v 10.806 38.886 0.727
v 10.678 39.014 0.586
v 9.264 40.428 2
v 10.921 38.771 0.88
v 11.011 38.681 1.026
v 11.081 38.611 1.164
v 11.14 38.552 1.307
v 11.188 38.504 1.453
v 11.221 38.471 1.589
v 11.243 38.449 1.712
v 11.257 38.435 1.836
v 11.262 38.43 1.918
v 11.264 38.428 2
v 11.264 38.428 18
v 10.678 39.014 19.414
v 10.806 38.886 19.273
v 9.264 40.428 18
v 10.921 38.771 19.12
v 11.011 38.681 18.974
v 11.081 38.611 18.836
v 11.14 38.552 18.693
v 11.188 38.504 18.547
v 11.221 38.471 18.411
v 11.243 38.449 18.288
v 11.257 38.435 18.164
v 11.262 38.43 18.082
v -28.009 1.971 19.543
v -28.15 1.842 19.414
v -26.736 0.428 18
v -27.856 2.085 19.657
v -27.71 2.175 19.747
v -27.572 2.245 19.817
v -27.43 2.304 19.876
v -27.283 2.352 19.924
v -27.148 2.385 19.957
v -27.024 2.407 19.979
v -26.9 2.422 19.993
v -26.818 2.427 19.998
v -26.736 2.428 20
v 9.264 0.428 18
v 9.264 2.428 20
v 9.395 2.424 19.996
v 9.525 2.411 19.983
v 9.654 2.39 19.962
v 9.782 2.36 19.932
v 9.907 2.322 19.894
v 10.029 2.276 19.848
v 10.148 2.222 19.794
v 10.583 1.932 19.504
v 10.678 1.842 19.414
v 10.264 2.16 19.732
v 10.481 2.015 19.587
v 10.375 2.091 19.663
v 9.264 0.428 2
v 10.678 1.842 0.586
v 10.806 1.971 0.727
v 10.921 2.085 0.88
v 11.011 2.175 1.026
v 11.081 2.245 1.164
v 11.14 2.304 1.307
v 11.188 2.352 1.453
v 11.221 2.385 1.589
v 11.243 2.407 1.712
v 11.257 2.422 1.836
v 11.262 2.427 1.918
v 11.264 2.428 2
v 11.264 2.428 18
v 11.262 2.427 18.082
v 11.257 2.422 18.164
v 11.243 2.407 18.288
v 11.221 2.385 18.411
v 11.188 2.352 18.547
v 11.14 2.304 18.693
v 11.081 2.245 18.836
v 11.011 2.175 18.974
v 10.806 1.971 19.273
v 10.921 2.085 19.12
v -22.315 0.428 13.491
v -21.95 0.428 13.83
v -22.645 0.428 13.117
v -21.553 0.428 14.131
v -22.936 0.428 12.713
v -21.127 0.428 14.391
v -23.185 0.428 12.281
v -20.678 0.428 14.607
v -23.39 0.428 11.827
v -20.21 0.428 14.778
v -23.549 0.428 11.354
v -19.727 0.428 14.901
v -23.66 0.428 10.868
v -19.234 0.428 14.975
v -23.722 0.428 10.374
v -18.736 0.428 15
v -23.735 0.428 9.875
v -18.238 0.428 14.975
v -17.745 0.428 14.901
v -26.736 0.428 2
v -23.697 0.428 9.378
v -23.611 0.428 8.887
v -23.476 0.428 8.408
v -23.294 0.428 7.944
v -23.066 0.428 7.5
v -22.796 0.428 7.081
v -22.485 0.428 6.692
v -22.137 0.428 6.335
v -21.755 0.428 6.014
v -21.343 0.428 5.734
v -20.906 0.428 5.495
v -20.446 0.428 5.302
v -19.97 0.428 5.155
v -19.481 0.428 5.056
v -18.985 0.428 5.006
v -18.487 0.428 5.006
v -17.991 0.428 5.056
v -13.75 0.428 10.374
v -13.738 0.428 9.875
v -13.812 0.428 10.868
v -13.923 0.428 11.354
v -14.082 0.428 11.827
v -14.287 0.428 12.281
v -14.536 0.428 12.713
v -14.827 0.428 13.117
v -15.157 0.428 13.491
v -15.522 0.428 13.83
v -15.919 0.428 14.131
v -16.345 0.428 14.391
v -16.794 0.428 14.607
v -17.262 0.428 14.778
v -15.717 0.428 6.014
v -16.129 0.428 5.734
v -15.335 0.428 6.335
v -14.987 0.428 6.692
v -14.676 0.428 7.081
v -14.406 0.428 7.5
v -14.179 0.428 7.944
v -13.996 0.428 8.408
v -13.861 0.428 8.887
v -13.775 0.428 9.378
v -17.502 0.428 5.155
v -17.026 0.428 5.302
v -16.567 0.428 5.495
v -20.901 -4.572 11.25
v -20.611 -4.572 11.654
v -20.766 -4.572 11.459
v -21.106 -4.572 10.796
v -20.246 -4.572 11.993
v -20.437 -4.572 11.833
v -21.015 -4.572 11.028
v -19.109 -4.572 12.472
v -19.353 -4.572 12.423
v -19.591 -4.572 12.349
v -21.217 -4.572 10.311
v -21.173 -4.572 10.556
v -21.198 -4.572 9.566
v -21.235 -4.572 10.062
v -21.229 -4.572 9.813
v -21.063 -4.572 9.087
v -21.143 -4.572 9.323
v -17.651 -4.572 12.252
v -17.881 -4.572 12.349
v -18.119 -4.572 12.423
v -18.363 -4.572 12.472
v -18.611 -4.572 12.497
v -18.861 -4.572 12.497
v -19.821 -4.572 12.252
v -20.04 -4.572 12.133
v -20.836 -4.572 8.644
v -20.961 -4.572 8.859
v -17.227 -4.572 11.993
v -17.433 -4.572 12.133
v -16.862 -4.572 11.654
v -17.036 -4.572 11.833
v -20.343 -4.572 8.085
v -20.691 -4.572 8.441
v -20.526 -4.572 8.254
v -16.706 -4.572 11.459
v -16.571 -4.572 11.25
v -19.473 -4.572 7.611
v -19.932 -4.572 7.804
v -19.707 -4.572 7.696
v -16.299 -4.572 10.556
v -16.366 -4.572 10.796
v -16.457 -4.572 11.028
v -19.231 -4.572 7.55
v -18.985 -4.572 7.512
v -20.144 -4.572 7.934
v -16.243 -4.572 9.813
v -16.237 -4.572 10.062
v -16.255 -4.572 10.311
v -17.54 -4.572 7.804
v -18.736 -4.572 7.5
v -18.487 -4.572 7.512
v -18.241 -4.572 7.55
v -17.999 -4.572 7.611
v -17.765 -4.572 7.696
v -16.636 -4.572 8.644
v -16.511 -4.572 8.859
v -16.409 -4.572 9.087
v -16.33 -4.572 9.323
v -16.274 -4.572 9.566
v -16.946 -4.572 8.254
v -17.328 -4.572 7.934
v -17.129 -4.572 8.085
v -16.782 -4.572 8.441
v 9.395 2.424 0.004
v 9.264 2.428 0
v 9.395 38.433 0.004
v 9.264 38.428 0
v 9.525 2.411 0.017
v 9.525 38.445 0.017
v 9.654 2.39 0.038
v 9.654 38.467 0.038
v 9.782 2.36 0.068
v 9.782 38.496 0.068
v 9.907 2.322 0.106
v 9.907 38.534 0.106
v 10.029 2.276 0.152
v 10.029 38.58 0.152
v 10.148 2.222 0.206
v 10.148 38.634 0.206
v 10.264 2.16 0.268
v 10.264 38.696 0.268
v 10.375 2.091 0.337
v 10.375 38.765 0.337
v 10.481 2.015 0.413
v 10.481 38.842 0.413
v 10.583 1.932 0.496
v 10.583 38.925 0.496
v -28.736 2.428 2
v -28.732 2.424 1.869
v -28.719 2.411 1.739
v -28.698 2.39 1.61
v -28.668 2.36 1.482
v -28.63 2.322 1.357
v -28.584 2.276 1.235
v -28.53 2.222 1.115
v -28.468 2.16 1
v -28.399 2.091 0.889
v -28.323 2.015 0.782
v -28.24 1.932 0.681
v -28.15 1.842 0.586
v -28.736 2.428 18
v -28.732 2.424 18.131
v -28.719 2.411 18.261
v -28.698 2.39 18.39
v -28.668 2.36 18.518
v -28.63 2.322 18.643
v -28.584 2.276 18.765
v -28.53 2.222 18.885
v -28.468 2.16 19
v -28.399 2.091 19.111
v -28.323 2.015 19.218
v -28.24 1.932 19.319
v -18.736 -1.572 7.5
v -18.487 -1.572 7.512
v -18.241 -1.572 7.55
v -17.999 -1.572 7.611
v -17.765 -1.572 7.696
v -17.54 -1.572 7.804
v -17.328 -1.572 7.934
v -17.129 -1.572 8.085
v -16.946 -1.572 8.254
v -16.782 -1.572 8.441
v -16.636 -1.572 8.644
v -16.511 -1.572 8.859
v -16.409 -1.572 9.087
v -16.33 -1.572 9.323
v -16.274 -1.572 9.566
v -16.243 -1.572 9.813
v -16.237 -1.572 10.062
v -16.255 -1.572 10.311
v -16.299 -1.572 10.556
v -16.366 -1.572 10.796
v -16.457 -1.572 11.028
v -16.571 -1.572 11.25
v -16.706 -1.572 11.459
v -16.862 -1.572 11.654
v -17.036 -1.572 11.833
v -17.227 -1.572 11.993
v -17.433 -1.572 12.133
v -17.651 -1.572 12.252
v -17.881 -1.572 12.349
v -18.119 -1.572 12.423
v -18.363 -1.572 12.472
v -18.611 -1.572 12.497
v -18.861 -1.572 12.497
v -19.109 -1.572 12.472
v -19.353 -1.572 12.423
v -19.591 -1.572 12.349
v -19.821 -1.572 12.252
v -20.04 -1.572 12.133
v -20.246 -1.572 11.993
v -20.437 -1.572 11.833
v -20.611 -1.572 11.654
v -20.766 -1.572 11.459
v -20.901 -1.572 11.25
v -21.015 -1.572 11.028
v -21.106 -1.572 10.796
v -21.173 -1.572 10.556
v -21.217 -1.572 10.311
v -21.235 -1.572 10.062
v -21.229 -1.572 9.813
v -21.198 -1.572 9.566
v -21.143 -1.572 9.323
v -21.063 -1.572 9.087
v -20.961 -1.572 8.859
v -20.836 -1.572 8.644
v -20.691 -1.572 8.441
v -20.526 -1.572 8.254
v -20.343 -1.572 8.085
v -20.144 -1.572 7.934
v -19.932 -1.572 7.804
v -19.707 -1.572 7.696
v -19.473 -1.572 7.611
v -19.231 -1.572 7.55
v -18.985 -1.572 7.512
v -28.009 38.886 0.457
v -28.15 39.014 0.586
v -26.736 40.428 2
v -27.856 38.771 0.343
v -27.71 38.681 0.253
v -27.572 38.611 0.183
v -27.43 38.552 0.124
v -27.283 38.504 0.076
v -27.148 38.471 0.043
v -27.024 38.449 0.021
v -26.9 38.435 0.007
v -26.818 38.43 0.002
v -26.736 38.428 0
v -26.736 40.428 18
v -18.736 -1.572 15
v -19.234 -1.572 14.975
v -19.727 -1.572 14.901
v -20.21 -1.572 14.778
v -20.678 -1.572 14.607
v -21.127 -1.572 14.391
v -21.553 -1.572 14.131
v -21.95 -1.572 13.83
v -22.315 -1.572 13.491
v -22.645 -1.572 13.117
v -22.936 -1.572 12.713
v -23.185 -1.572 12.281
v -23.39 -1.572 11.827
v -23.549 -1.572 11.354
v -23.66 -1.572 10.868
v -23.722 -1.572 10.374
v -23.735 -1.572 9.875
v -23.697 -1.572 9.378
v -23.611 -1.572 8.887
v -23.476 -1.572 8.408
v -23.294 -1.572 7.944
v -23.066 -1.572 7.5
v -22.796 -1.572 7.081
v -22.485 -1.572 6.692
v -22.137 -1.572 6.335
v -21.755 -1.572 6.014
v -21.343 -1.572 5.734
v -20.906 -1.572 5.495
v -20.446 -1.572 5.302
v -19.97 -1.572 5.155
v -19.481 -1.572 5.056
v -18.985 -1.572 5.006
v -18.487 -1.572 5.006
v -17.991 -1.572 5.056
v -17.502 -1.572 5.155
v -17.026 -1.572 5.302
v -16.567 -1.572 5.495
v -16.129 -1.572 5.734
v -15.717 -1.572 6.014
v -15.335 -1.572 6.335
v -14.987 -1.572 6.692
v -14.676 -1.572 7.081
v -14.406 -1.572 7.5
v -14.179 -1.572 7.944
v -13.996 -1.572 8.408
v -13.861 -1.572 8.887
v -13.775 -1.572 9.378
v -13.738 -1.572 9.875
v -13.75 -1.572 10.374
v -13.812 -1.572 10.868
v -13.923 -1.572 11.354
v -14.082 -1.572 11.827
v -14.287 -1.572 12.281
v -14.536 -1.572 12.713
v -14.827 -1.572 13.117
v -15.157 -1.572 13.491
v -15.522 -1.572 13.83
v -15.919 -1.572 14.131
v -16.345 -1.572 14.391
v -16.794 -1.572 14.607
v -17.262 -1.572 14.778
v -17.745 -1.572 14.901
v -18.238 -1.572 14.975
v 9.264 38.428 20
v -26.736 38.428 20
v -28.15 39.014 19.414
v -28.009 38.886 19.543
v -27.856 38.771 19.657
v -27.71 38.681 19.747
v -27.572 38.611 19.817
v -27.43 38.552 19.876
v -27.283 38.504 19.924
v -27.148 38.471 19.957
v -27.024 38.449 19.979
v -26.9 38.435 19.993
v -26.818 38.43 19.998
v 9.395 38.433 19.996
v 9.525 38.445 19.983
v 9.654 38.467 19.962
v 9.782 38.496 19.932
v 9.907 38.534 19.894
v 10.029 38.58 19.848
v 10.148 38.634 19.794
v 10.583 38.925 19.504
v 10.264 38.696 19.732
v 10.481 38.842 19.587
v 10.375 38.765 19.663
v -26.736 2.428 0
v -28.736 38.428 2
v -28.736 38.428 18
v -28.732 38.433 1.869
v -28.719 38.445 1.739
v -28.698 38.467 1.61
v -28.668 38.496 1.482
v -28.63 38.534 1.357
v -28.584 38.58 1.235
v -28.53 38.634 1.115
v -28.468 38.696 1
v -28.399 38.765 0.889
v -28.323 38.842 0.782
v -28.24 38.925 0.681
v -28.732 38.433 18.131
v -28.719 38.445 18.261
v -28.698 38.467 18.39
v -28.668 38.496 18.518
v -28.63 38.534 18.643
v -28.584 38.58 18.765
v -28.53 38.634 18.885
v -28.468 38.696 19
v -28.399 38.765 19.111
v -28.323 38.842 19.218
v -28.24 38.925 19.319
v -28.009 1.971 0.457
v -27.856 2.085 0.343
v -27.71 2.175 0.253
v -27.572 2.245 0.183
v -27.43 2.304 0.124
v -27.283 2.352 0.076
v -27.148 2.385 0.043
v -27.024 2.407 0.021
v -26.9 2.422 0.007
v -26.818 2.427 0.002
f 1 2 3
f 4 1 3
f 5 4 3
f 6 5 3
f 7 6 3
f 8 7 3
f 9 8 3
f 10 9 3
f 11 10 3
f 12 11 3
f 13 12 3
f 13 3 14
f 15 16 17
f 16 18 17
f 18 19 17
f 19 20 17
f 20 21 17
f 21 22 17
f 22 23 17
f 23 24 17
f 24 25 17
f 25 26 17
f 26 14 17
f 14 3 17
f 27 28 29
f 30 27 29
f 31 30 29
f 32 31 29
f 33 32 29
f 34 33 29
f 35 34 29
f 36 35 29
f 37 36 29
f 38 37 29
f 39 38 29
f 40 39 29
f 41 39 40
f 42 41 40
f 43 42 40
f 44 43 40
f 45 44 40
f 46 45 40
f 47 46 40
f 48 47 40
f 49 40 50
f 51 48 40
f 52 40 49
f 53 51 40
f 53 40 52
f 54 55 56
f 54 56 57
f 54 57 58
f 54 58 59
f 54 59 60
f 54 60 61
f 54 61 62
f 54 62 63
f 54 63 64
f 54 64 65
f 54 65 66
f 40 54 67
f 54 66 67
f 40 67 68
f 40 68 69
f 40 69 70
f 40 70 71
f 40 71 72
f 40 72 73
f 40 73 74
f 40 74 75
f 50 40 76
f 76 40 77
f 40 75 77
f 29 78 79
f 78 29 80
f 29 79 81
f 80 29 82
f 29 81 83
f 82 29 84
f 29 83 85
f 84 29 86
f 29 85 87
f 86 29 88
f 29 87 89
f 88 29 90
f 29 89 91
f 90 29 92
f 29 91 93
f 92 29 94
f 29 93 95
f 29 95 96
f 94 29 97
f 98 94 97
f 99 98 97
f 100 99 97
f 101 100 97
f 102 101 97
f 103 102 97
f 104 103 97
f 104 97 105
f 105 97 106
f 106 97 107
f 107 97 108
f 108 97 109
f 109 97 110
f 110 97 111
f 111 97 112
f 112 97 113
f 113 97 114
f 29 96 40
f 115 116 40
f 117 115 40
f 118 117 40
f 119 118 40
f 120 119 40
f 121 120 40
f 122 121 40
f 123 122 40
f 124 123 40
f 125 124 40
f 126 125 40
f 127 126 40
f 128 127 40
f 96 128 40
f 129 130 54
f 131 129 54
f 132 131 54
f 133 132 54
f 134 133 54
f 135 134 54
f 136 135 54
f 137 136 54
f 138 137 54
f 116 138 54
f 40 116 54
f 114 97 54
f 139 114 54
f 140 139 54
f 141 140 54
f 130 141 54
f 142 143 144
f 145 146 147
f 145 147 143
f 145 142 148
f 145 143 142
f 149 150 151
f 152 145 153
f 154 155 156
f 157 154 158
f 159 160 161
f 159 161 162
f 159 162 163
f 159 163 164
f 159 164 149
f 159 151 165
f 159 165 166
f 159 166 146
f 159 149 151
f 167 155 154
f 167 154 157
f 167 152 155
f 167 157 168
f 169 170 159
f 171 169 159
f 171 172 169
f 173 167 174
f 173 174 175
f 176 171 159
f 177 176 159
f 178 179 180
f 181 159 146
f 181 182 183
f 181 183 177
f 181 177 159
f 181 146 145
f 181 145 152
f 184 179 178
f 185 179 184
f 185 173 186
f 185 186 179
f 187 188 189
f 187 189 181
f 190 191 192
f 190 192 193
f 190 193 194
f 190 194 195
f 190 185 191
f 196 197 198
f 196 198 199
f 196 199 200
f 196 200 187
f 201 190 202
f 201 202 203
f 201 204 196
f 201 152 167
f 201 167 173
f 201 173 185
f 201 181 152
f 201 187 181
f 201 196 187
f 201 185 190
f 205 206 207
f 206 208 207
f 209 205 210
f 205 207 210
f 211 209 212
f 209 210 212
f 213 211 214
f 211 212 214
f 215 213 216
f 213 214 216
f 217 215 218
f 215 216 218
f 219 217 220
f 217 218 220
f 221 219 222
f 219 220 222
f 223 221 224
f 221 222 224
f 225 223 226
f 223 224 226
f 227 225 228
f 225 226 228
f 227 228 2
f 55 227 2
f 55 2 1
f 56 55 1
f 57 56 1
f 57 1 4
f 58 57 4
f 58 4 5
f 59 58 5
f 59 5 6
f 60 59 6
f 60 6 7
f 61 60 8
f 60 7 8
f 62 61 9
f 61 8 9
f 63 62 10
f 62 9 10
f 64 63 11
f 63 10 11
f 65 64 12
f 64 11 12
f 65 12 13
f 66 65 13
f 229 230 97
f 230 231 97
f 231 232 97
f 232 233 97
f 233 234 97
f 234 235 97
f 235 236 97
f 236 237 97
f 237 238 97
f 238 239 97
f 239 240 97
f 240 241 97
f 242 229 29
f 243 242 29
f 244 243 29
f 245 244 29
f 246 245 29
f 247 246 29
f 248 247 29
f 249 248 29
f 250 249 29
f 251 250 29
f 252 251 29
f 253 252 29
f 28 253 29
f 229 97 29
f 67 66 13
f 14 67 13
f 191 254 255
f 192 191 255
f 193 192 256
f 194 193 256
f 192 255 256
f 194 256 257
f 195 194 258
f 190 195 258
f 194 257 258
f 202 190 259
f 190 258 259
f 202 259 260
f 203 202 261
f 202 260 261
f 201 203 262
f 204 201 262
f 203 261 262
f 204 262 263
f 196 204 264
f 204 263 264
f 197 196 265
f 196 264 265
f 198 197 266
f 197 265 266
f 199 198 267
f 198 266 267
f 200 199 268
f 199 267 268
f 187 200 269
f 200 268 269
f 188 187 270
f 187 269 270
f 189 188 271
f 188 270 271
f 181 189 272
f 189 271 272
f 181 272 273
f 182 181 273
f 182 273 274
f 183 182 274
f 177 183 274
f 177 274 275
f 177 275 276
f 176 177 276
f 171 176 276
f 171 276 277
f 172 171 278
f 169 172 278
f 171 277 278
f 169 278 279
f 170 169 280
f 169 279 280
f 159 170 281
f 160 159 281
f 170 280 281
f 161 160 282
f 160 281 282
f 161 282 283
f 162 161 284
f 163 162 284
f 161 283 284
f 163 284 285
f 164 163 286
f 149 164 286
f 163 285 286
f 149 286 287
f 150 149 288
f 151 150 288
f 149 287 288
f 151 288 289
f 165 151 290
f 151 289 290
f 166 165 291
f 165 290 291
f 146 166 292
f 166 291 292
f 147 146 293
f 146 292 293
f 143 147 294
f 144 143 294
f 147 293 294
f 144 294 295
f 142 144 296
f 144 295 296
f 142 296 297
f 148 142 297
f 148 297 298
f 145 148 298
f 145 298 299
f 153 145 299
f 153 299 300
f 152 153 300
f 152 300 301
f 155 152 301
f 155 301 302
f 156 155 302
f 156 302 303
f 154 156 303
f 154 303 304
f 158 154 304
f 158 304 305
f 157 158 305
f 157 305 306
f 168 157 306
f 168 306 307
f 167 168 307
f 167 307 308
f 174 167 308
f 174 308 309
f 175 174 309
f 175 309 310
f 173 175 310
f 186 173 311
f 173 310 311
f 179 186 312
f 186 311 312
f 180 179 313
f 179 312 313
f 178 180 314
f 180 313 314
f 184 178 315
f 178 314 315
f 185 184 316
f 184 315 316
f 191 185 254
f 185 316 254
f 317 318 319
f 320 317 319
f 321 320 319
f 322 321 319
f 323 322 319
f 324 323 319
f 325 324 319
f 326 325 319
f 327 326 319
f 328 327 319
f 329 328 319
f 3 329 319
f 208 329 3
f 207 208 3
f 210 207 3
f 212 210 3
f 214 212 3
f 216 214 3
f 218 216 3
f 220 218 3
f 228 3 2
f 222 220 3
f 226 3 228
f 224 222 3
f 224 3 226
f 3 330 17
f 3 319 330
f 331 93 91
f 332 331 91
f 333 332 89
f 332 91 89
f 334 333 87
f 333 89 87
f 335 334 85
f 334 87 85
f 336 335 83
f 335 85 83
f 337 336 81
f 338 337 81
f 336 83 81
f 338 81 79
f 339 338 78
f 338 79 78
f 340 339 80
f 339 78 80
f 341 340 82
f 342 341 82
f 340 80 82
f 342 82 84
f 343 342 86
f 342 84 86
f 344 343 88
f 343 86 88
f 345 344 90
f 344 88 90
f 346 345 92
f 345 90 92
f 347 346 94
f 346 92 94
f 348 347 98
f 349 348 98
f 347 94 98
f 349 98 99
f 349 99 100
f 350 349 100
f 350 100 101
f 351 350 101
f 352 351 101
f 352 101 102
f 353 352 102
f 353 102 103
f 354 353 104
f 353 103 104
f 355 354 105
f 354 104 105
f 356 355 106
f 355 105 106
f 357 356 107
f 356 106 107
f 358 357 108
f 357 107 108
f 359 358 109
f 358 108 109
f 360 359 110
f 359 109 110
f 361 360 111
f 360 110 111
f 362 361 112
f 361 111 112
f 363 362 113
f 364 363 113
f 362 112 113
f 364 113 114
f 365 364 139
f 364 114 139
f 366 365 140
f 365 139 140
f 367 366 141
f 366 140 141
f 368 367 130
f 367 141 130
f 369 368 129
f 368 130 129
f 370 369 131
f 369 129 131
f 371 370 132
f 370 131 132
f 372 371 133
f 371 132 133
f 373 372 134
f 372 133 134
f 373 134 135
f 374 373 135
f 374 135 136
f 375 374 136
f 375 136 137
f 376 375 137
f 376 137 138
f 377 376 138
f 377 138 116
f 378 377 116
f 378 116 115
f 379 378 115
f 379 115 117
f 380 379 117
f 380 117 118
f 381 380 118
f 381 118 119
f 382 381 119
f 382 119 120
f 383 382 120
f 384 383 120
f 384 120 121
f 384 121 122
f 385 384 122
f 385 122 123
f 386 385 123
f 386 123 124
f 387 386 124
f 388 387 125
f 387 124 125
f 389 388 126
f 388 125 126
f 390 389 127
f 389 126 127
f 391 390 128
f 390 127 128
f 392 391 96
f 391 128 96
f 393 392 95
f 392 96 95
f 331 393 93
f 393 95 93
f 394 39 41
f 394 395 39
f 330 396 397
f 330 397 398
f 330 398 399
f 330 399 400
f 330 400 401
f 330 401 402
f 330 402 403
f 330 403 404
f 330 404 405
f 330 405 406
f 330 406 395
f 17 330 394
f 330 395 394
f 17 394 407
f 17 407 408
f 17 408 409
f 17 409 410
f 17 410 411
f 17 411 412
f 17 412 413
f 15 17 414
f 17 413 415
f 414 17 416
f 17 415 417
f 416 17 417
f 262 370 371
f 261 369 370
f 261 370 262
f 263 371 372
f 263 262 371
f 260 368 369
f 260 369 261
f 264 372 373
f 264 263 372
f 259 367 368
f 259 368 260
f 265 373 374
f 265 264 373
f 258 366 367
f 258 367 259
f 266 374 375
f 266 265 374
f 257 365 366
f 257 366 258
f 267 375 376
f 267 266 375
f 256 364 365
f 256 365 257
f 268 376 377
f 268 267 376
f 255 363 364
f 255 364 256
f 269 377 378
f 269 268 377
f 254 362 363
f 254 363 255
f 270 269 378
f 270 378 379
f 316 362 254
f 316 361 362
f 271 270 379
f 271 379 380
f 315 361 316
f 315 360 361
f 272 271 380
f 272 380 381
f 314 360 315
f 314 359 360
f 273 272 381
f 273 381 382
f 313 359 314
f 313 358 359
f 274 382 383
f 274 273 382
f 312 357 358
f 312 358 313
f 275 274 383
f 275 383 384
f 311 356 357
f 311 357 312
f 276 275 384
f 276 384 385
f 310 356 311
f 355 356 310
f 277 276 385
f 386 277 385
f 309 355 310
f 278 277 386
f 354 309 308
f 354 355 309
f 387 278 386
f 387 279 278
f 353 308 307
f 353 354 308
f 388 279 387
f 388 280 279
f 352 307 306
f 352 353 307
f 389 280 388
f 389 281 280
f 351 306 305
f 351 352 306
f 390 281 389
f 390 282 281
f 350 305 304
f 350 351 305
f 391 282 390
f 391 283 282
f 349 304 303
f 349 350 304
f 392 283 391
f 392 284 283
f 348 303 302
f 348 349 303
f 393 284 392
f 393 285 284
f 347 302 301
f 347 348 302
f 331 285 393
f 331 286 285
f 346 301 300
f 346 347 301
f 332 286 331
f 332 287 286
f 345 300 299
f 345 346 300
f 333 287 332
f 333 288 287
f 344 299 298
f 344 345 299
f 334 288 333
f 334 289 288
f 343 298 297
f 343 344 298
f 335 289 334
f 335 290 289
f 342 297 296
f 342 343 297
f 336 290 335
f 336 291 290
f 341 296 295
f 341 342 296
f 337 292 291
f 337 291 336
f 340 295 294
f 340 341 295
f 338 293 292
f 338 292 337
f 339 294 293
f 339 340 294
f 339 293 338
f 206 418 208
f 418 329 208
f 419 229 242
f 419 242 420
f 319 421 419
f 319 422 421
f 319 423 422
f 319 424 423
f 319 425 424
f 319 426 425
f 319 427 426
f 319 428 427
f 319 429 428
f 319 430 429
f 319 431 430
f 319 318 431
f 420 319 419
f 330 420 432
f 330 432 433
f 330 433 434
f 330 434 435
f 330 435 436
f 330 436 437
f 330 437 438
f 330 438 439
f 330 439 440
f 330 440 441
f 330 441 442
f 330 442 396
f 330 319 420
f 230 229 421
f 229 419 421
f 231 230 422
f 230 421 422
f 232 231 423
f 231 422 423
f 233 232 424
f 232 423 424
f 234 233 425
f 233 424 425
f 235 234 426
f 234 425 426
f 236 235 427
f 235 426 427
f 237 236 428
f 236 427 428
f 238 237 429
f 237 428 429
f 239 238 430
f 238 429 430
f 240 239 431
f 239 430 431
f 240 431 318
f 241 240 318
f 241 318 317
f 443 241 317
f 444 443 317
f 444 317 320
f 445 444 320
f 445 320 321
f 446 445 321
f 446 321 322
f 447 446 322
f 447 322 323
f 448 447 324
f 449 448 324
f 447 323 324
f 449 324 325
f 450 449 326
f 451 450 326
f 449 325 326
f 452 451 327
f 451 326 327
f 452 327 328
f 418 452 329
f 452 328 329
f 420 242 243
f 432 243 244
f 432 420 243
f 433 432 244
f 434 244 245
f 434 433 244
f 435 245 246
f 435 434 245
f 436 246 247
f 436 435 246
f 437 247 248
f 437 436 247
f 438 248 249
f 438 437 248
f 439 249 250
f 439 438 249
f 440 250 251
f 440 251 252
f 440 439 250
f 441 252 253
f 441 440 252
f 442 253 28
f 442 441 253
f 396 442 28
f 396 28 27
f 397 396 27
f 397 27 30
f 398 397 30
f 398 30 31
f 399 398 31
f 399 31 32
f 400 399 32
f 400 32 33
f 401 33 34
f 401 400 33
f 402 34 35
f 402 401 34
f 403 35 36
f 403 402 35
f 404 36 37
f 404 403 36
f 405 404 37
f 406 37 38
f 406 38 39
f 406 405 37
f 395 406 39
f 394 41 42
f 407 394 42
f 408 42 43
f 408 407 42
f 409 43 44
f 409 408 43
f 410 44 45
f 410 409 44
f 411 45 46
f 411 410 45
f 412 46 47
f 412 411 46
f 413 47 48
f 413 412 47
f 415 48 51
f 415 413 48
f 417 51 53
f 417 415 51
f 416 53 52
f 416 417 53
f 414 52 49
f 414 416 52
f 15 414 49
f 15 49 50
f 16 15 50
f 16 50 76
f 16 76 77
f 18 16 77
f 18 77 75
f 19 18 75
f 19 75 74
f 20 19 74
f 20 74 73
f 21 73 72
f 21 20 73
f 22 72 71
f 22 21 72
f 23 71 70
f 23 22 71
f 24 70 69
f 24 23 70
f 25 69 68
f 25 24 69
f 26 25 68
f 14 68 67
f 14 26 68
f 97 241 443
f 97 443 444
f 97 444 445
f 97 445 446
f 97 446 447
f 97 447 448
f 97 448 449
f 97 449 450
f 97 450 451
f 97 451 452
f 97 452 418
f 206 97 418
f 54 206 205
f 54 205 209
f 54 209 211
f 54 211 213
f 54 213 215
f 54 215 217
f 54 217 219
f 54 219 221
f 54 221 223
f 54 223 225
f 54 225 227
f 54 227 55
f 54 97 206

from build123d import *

# Parameters (mm, degrees)
SKETCH_1_W      = 40
SKETCH_1_H      = 40
EXTRUDE_1_DEPTH = 20
CHAMFER_2_SIZE  = 2
SKETCH_2_R      = 5
EXTRUDE_3_DEPTH = 2
SKETCH_4_R      = 2.5
EXTRUDE_6_DEPTH = 3
CHAMFER_3_SIZE  = 2
FILLET_1_R      = 2


with BuildPart() as part:
    # 草图1 → 凸台-拉伸1 (new body)
    with BuildSketch(Plane.XY):
        with Locations((-8.736097926, 20.42824298)):
            Rectangle(SKETCH_1_W, SKETCH_1_H)
    extrude(amount=EXTRUDE_1_DEPTH)

    # 倒角2
    chamfer_2_edges = [part.edges().sort_by_distance(p)[0] for p in [
        (-8.736097926, 40.42824298, 20),
        (-8.736097926, 40.42824298, 0),
        (-28.736097926, 40.42824298, 10),
        (11.263902074, 40.42824298, 10),
    ]]
    chamfer(chamfer_2_edges, length=CHAMFER_2_SIZE)

    # 草图2 → 凸台-拉伸3 (add)
    with BuildSketch(Plane(origin=(0, 0.42824298, 0), x_dir=(-1, 0, 0), z_dir=(0, -1, 0))):
        with Locations(Location((18.736097926, -10, 0), (0, 0, 270))):
            Circle(SKETCH_2_R)
    extrude(amount=EXTRUDE_3_DEPTH)

    # 草图4 → 凸台-拉伸6 (add)
    with BuildSketch(Plane.XZ.offset(1.57175702)):
        with Locations(Location((-18.736097926, 10, 0), (0, 0, 270))):
            Circle(SKETCH_4_R)
    extrude(amount=EXTRUDE_6_DEPTH)

    # 倒角3
    chamfer_3_edges = [part.edges().sort_by_distance(p)[0] for p in [
        (-8.736097926, 0.42824298, 20),
        (-8.736097926, 0.42824298, 0),
        (-28.736097926, 0.42824298, 10),
        (11.263902074, 0.42824298, 10),
    ]]
    chamfer(chamfer_3_edges, length=CHAMFER_3_SIZE)

    # 圆角1
    fillet_1_edges = [part.edges().sort_by_distance(p)[0] for p in [
        (11.263902074, 20.42824298, 0),
        (11.263902074, 20.42824298, 20),
        (-28.736097926, 20.42824298, 0),
        (-28.736097926, 20.42824298, 20),
    ]]
    fillet(fillet_1_edges, radius=FILLET_1_R)


solid = part.part
